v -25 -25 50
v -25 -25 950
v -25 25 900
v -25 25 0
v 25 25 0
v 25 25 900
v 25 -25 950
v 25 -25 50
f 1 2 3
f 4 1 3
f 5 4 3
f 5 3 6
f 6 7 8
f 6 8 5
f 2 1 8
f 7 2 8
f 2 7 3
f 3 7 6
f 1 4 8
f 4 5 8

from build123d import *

# Parameters (mm, degrees)
F0_W          = 50
F0_H          = 50
F1_DEPTH      = 950
F3_DEPTH      = 25.001
F3_DEPTH_BACK = 25.001
F5_DEPTH      = 25.001
F5_DEPTH_BACK = 25.001


with BuildPart() as f1:
    # F0 (on Top) → F1 (new body)
    with BuildSketch(Plane.XY):
        Rectangle(F0_W, F0_H)
    extrude(amount=F1_DEPTH)

    # F2 (on Right) → F3 (cut, two sides)
    with BuildSketch(Plane.YZ) as f3_sk:
        Polygon((135.3058686236, 950), (-25, 950), (135.3058686236, 789.6941313764), align=None)
    extrude(amount=-F3_DEPTH, mode=Mode.SUBTRACT)
    extrude(f3_sk.sketch, amount=F3_DEPTH_BACK, mode=Mode.SUBTRACT)

    # F4 (on Right) → F5 (cut, two sides)
    with BuildSketch(Plane.YZ) as f5_sk:
        Polygon((-25, 0), (25, 0), (-25, 50), align=None)
    extrude(amount=-F5_DEPTH, mode=Mode.SUBTRACT)
    extrude(f5_sk.sketch, amount=F5_DEPTH_BACK, mode=Mode.SUBTRACT)


solid = f1.part
